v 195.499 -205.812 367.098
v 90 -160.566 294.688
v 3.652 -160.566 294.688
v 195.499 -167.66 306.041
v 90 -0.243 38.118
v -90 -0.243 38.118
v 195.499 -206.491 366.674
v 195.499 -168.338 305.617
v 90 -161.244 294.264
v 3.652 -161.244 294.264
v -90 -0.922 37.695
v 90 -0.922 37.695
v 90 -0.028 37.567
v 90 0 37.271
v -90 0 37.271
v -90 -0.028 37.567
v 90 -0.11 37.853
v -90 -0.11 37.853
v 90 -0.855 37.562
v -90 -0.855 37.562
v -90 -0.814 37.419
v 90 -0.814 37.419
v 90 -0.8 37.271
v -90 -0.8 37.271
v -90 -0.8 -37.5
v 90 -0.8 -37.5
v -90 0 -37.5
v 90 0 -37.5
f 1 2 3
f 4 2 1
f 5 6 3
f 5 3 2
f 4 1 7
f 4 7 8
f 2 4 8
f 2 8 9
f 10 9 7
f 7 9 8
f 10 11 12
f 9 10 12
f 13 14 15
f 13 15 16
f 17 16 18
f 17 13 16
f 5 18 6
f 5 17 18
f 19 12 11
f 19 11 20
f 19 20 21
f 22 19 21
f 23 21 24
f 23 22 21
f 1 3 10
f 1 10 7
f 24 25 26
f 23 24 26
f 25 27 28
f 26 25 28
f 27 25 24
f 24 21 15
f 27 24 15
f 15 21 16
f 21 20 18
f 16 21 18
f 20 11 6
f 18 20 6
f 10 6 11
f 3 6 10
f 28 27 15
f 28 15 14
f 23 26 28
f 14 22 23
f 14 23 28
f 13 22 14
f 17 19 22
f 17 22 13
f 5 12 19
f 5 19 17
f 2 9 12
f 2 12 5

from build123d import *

# Parameters (mm, degrees)
SKETCH1_W                    = 180
SKETCH1_H                    = 75
BASE_FLANGE1_DEPTH           = 0.8
EDGE_FLANGE1_STRIP_CUT_DEPTH = 180
EDGE_FLANGE1_DEPTH           = 180
CUT_EXTRUDE1_DEPTH           = 10
TAB1_DEPTH                   = 0.8


# Sheet-metal steps are written as plain solids
with BuildPart() as part:
    # Sketch1 → Base-Flange1 (new body)
    with BuildSketch(Plane(origin=(0, 0, 0), x_dir=(1, 0, 0), z_dir=(0, 1, 0))):
        Rectangle(SKETCH1_W, SKETCH1_H)
    extrude(amount=-BASE_FLANGE1_DEPTH)

    # Edge-Flange1 strip (across the edge) → Edge-Flange1 strip cut (cut)
    with BuildSketch(Plane(origin=(90, -0.8, 37.5), x_dir=(0, -0.8480480961564291, -0.5299192642332), z_dir=(-1, 0, 0))):
        Polygon((-3.100489422, 3.452156347), (-0.556876954, -0.618474514), (0.121561523, -0.194539103), (-2.422050945, 3.876091759), align=None)
    extrude(amount=EDGE_FLANGE1_STRIP_CUT_DEPTH, mode=Mode.SUBTRACT)

    # Edge-Flange1 section (across the edge) → Edge-Flange1 (add)
    with BuildSketch(Plane(origin=(90, -0.8, 37.5), x_dir=(0, -0.8480480961564291, -0.5299192642332), z_dir=(-1, 0, 0))):
        with BuildLine():
            Line((-0.8, 0.229396309), (-0.8, 302.770603691))
            Line((-0.8, 302.770603691), (0, 302.770603691))
            Line((0, 302.770603691), (0, 0.229396309))
            ThreePointArc((0, 0.229396309), (0.030990643, 0.008886424), (0.121561523, -0.194539103))
            Line((0.121561523, -0.194539103), (-0.556876954, -0.618474514))
            ThreePointArc((-0.556876954, -0.618474514), (-0.738018714, -0.211623461), (-0.8, 0.229396309))
        make_face()
    extrude(amount=EDGE_FLANGE1_DEPTH)

    # Sketch5 → Cut-Extrude1 (cut)
    with BuildSketch(Plane(origin=(0, 16.955478386, 10.594958791), x_dir=(1, 0, 0), z_dir=(0, 0.8480480961564291, 0.5299192642332))):
        Polygon((-90, -32.455135326), (11.580249487, -360.607900661), (-238.910363798, -331.986176437), align=None)
    extrude(amount=-CUT_EXTRUDE1_DEPTH, mode=Mode.SUBTRACT)

    # Sketch6 → Tab1 (add)
    with BuildSketch(Plane(origin=(0, 16.955478386, 10.594958791), x_dir=(1, 0, 0), z_dir=(0, 0.8480480961564291, 0.5299192642332001))):
        Polygon((3.65214794, -334.996342709), (195.49906109, -420.380554221), (195.49906109, -348.383732857), (90, -334.996342709), align=None)
    extrude(amount=-TAB1_DEPTH)


solid = part.part
